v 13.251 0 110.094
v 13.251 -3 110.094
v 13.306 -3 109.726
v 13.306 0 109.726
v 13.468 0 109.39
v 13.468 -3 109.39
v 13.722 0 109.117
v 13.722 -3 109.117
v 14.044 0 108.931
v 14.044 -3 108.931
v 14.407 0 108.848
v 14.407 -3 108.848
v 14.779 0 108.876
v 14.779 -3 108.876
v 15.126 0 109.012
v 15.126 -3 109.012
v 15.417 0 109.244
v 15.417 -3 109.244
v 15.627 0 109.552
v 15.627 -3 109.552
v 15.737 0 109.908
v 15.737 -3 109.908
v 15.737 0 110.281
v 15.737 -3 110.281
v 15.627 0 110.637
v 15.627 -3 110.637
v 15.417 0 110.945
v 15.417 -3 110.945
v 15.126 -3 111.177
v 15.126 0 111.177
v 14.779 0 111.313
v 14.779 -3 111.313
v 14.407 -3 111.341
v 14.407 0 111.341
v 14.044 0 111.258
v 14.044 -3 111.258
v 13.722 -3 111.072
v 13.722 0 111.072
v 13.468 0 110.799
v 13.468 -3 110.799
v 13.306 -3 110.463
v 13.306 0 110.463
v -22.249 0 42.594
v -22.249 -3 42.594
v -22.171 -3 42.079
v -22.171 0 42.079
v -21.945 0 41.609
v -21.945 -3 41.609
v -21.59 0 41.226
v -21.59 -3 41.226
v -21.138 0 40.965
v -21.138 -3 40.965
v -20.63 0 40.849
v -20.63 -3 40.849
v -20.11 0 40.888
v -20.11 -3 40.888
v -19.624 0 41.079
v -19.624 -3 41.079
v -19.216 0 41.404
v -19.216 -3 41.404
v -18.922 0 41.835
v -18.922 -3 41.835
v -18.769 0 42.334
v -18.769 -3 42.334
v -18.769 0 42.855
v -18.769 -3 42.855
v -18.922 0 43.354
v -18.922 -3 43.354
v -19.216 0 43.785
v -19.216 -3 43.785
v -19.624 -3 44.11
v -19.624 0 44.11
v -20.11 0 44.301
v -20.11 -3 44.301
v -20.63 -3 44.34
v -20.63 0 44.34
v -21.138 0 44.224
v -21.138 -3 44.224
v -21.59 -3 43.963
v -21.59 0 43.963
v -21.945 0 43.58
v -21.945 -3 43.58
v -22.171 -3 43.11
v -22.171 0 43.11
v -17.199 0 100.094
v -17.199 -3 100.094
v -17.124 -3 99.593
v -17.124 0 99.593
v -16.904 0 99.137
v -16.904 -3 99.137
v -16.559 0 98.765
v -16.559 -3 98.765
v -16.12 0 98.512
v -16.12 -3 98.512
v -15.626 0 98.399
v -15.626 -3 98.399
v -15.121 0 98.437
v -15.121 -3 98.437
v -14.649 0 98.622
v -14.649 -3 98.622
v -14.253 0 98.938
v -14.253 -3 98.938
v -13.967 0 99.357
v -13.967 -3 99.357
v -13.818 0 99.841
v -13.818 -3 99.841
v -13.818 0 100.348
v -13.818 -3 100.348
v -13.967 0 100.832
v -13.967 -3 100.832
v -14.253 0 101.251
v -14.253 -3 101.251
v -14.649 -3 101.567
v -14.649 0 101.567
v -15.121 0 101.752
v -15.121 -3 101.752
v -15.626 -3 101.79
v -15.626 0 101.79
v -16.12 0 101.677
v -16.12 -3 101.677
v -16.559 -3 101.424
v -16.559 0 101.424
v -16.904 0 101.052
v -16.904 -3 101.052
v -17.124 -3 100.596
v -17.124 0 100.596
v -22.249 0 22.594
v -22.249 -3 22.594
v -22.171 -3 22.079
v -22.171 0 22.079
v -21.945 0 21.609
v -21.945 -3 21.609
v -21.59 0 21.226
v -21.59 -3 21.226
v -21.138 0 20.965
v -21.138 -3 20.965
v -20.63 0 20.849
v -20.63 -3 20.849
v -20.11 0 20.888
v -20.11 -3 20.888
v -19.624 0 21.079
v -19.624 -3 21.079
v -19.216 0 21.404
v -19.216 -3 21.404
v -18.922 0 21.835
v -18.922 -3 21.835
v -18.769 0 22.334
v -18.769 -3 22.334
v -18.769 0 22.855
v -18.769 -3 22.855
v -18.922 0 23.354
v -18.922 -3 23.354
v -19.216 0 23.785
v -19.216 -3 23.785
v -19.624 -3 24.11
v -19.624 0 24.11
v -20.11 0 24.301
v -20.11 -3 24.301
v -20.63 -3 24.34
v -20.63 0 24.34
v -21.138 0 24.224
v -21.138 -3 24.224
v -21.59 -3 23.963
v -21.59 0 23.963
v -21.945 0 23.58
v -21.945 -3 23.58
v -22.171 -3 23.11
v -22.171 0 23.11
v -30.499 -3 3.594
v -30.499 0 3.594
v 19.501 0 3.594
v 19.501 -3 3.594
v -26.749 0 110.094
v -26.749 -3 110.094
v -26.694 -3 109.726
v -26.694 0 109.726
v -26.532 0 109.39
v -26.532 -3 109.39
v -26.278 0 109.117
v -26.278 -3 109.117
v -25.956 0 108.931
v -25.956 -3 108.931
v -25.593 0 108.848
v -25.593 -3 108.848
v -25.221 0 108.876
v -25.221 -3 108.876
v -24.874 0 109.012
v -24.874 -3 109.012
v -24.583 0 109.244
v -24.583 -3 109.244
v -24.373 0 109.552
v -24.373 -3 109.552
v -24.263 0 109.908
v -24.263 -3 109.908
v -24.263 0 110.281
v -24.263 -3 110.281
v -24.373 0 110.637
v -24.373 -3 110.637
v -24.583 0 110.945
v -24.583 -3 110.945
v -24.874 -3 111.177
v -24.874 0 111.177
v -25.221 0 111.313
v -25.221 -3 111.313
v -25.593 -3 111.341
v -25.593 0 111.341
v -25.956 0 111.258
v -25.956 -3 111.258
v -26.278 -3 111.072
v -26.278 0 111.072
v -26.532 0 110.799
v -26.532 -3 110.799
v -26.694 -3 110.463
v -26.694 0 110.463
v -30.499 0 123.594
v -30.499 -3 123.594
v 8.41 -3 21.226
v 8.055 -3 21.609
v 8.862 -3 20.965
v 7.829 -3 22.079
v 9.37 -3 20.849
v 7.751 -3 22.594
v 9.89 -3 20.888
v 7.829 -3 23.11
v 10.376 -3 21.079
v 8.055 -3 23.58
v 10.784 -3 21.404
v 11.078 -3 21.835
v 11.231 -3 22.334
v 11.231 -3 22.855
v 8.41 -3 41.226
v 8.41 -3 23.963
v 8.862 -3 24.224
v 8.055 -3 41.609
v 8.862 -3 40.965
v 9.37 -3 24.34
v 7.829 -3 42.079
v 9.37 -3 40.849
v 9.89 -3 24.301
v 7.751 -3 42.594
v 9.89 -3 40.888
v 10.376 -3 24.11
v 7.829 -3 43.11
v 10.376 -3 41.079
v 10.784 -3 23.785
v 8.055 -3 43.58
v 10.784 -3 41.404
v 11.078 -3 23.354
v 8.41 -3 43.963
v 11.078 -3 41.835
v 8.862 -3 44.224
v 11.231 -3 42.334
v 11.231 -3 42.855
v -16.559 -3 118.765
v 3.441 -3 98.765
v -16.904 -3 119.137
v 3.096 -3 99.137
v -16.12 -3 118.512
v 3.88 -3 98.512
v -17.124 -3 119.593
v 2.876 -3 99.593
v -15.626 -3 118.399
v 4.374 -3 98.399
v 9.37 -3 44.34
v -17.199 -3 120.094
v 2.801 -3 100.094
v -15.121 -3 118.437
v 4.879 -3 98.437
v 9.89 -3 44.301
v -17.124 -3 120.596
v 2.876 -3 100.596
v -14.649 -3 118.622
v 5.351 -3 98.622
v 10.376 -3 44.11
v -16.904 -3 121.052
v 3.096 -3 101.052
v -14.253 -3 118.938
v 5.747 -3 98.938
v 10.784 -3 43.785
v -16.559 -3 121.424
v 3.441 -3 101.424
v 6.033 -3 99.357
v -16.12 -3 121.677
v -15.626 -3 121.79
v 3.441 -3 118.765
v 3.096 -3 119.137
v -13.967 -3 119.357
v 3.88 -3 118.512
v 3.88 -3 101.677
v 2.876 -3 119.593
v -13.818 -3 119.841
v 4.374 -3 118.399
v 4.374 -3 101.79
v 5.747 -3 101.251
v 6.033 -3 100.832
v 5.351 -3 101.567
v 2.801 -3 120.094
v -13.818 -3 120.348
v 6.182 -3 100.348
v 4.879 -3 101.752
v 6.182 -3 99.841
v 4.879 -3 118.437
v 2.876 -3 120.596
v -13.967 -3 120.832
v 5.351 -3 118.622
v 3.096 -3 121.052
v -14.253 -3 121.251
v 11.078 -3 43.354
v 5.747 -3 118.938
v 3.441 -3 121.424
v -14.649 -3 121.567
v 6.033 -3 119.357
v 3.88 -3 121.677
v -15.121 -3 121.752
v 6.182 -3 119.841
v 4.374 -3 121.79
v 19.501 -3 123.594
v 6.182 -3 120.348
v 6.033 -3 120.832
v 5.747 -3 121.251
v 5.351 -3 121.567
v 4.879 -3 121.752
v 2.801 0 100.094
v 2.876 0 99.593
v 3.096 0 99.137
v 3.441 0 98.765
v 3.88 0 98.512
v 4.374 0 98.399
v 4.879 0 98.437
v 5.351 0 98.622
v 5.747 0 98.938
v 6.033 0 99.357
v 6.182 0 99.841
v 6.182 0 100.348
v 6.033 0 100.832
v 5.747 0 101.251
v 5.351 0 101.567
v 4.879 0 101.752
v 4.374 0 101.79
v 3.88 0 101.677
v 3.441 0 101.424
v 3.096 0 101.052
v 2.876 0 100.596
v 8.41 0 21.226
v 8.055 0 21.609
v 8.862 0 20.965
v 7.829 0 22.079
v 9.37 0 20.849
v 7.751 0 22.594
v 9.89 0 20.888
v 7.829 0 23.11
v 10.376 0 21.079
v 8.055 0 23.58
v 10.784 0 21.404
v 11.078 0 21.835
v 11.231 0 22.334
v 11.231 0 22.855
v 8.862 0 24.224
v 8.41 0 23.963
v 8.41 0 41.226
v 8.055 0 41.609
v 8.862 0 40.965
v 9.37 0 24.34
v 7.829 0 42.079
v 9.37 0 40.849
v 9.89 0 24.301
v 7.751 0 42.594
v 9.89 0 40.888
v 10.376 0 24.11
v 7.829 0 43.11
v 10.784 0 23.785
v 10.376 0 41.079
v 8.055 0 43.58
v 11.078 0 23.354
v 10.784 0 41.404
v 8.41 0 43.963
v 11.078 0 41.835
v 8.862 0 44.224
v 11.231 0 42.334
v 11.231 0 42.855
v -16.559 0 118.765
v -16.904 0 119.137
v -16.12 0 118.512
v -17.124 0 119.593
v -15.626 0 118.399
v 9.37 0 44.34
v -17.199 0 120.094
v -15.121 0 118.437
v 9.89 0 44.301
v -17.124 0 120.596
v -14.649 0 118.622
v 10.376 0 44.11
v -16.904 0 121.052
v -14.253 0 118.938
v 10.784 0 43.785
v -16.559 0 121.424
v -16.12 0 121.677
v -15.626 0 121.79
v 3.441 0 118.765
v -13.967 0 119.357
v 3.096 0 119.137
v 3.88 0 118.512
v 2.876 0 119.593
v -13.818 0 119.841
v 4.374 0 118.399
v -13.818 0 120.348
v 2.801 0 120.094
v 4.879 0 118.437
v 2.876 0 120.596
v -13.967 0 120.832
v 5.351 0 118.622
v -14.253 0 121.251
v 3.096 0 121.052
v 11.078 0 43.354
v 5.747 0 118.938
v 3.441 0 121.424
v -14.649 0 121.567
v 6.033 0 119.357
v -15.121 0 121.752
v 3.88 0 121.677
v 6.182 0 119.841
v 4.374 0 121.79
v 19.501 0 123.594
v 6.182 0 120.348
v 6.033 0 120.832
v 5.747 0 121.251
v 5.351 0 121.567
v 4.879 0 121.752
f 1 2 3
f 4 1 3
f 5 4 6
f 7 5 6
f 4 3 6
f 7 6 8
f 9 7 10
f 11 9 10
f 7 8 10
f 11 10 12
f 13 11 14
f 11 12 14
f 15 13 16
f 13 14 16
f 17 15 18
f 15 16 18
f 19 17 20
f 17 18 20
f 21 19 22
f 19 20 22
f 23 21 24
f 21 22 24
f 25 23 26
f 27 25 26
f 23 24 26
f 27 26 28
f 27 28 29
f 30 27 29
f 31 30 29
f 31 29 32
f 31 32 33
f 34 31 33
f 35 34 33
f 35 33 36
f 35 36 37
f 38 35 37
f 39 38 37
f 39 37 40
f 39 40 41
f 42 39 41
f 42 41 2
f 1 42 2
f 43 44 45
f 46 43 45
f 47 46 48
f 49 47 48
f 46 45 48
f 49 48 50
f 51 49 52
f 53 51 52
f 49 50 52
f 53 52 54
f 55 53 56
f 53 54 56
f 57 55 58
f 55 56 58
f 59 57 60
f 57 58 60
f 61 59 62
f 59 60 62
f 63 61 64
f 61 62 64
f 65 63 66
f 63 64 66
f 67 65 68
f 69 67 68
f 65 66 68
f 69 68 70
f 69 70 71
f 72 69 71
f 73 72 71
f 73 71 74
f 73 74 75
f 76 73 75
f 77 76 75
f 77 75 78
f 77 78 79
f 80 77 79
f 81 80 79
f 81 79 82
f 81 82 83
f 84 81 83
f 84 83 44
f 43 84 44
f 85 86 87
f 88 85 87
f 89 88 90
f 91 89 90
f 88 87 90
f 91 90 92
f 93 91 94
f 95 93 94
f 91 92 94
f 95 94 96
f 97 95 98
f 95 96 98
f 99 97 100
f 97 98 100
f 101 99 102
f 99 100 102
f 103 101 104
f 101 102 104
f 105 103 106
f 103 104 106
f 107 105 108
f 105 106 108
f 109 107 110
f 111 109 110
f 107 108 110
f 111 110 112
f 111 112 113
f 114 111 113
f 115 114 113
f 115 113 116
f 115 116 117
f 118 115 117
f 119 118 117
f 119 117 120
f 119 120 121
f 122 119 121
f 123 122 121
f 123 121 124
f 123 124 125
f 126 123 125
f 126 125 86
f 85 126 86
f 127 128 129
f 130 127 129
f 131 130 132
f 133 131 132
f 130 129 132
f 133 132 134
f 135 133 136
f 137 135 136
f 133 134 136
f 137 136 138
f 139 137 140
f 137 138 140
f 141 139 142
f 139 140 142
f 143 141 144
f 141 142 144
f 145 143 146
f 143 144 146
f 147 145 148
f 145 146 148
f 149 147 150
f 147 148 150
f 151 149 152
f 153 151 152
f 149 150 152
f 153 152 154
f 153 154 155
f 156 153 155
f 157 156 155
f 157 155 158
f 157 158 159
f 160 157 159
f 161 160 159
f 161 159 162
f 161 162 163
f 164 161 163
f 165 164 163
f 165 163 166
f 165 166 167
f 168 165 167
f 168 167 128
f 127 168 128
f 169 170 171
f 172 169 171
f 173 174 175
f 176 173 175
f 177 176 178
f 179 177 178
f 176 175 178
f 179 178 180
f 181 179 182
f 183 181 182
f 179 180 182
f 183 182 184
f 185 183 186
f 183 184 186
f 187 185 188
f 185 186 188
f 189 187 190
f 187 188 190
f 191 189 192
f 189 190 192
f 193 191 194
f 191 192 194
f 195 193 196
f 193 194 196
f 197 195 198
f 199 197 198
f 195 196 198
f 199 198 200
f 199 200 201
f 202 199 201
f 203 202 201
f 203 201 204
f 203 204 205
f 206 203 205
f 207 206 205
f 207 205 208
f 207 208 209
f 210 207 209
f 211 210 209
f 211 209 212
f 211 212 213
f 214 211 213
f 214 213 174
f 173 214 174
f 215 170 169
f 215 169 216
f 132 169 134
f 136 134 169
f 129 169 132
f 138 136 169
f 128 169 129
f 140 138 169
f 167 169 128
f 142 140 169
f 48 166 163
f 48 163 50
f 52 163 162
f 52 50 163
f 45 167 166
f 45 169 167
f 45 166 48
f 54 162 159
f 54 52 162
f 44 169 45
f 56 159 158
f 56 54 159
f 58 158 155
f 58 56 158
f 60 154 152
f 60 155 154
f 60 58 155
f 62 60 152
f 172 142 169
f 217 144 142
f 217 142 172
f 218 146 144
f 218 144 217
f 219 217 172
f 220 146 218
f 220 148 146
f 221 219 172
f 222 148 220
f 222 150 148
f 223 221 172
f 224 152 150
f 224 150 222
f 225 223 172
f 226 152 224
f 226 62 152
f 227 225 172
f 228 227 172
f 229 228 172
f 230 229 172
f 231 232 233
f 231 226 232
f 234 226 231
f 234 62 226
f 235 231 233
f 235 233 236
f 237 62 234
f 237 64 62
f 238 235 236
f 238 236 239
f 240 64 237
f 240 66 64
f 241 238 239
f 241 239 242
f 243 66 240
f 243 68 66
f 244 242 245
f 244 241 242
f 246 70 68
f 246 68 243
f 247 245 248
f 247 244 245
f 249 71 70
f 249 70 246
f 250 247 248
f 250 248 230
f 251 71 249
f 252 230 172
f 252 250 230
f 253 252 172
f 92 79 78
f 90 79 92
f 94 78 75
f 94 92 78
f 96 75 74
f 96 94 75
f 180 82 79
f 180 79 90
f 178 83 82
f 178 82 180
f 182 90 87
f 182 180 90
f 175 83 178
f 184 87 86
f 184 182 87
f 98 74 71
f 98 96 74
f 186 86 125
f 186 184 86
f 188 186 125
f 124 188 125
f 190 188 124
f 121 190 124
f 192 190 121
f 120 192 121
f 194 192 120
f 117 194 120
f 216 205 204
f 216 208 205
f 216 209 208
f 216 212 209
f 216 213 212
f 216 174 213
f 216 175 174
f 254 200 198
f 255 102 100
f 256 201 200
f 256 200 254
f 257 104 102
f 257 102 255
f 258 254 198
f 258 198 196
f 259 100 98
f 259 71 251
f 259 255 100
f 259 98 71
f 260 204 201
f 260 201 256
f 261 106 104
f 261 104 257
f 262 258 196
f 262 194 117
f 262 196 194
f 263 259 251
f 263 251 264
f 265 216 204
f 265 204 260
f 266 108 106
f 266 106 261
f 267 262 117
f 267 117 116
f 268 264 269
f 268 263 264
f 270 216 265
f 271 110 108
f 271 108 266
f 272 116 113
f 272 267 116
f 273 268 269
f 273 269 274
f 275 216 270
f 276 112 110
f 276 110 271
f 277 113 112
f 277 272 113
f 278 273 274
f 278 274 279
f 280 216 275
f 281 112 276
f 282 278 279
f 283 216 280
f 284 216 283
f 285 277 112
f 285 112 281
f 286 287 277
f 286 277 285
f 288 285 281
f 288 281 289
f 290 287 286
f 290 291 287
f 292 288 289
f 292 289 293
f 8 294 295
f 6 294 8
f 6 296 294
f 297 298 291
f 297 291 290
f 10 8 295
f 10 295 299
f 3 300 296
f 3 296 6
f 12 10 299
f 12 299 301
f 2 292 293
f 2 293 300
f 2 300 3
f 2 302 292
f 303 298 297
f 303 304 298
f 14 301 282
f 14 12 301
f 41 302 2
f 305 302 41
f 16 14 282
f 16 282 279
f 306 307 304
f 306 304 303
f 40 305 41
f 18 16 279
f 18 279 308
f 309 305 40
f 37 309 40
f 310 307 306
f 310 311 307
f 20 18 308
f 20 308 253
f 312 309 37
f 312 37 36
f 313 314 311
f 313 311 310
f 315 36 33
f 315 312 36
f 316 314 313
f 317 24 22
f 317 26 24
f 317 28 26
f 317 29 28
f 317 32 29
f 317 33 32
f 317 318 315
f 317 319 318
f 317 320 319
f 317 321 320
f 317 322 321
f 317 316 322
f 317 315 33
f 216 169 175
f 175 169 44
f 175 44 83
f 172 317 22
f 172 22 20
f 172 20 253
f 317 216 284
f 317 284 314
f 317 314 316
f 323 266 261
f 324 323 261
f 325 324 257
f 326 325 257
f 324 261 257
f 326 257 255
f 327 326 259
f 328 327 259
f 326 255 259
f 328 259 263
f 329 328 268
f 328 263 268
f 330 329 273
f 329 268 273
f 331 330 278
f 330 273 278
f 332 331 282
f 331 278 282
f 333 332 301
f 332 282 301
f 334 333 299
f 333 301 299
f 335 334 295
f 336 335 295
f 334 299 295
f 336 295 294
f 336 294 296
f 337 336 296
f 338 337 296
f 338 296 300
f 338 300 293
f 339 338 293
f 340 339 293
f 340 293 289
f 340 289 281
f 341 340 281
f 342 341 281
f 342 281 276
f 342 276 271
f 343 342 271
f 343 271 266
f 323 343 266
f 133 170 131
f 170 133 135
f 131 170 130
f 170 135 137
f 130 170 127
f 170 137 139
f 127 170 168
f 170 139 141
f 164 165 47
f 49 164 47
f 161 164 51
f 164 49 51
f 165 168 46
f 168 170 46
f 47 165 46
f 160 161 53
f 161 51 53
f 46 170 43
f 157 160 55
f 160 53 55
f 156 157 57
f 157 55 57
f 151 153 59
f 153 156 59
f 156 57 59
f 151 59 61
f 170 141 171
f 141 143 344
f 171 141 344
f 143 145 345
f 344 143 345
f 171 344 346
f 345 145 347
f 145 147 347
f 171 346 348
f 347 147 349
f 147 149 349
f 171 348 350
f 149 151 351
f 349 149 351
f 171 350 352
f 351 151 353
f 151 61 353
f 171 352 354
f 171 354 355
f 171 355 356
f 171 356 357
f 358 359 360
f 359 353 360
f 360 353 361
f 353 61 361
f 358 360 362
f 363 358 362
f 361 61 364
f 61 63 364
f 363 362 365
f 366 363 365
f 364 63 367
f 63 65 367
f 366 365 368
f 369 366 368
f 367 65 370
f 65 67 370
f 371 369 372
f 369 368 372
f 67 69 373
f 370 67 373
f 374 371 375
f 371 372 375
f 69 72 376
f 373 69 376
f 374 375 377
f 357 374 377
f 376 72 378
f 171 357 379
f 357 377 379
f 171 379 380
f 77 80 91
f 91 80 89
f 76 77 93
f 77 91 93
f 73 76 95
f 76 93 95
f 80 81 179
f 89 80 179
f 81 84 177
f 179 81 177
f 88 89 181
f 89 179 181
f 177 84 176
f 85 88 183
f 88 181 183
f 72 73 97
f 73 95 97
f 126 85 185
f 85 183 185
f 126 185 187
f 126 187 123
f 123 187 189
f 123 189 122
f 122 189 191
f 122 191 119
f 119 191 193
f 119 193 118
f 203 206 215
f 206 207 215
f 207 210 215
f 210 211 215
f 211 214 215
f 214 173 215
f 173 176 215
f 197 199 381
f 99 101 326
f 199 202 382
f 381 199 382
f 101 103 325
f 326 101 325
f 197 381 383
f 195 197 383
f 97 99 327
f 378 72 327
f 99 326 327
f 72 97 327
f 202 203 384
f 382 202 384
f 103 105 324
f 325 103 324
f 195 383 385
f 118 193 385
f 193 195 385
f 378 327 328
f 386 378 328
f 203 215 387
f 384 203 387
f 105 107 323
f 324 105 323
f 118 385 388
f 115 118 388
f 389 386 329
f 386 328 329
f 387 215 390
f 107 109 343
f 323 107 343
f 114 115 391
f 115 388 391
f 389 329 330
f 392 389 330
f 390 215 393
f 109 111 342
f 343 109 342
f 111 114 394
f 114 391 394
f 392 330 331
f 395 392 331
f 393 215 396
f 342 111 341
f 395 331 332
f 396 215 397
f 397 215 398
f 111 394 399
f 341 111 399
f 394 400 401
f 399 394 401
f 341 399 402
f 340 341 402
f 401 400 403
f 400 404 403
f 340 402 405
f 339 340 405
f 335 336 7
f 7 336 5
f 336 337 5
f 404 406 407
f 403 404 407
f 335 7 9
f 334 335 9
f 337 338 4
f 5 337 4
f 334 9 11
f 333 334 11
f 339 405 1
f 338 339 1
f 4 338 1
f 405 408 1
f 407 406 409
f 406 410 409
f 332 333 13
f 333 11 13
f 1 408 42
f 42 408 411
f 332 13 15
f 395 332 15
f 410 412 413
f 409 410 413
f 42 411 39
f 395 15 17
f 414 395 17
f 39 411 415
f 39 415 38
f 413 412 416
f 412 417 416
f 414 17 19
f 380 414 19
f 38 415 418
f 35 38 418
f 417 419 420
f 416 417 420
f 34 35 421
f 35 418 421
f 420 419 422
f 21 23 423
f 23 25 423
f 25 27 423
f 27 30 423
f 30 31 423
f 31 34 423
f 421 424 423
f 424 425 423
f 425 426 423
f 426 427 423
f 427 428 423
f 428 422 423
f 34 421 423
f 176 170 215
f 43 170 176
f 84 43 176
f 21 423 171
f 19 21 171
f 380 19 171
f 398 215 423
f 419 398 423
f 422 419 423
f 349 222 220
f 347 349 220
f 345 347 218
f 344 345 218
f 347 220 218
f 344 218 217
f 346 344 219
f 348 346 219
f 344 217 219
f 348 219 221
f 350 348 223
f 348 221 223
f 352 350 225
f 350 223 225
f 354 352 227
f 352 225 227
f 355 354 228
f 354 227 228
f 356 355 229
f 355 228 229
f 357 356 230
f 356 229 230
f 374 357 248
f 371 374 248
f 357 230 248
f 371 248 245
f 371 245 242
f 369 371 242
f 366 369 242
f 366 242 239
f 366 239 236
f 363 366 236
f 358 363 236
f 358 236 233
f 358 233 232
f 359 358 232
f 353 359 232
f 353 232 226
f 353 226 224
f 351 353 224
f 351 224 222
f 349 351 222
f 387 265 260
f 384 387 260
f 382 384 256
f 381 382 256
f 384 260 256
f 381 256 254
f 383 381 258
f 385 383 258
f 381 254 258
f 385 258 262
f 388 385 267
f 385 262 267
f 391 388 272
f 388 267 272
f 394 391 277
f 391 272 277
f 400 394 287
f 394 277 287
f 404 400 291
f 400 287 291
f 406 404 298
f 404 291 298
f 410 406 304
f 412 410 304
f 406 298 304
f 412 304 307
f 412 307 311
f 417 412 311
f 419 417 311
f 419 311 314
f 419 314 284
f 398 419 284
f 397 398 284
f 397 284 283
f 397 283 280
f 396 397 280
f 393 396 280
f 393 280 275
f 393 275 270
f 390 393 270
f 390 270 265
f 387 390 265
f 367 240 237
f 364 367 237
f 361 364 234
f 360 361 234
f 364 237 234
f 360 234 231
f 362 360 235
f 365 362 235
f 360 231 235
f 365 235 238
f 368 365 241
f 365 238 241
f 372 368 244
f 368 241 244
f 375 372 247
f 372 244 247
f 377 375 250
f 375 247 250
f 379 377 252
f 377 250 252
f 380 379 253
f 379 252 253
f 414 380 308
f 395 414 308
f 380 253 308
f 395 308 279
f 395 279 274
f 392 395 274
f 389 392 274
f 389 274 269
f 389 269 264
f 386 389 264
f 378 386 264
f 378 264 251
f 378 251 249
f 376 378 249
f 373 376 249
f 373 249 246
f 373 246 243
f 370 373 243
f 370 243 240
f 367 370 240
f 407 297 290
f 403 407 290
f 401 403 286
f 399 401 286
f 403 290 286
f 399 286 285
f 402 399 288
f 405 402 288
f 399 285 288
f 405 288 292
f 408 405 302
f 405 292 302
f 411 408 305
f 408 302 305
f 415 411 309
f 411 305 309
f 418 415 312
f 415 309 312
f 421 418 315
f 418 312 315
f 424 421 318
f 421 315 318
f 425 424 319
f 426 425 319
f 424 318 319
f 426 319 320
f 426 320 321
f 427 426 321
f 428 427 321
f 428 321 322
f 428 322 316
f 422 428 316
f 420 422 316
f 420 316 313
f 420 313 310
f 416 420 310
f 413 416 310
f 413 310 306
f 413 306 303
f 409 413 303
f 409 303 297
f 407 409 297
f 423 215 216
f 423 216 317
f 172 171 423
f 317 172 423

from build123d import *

# Parameters (mm, degrees)
F0_W     = 50
F0_H     = 150
F1_DEPTH = 3
F2_D     = 3.4
F3_D     = 2.5
F4_D     = 3.5
F5_DEPTH = 30


with BuildPart() as f1:
    # F0 (on Front) → F1 (new body)
    with BuildSketch(Plane.XZ):
        with Locations((-5.4991092533, 48.5944904387)):
            Rectangle(F0_W, F0_H)
    extrude(amount=F1_DEPTH)

    # F2 (through all)
    with Locations(Plane(origin=(0, 0, 0), x_dir=(1, 0, 0), z_dir=(0, 1, 0))):
        with Locations((4.5008907467, -120.0944904387), (-15.4991092533, -120.0944904387), (-15.4991092533, -100.0944904387), (4.5008907467, -100.0944904387)):
            Hole(F2_D / 2)

    # F3 (through all)
    with Locations(Plane(origin=(0, 0, 0), x_dir=(1, 0, 0), z_dir=(0, 1, 0))):
        with Locations((14.5008907467, -110.0944904387), (-25.4991092533, -110.0944904387)):
            Hole(F3_D / 2)

    # F4 (through all)
    with Locations(Plane(origin=(0, 0, 0), x_dir=(1, 0, 0), z_dir=(0, 1, 0))):
        with Locations((-20.4991092533, -42.5944904387), (-20.4991092533, -22.5944904387), (9.5008907467, -22.5944904387), (9.5008907467, -42.5944904387)):
            Hole(F4_D / 2)

    # F5 (cut): a face of the model
    f5_faces = [f1.faces().sort_by_distance(p)[0] for p in [
        (-5.4991092533, -1.5, -26.4055095613),
    ]]
    extrude(f5_faces, amount=-F5_DEPTH, mode=Mode.SUBTRACT)


solid = f1.part
